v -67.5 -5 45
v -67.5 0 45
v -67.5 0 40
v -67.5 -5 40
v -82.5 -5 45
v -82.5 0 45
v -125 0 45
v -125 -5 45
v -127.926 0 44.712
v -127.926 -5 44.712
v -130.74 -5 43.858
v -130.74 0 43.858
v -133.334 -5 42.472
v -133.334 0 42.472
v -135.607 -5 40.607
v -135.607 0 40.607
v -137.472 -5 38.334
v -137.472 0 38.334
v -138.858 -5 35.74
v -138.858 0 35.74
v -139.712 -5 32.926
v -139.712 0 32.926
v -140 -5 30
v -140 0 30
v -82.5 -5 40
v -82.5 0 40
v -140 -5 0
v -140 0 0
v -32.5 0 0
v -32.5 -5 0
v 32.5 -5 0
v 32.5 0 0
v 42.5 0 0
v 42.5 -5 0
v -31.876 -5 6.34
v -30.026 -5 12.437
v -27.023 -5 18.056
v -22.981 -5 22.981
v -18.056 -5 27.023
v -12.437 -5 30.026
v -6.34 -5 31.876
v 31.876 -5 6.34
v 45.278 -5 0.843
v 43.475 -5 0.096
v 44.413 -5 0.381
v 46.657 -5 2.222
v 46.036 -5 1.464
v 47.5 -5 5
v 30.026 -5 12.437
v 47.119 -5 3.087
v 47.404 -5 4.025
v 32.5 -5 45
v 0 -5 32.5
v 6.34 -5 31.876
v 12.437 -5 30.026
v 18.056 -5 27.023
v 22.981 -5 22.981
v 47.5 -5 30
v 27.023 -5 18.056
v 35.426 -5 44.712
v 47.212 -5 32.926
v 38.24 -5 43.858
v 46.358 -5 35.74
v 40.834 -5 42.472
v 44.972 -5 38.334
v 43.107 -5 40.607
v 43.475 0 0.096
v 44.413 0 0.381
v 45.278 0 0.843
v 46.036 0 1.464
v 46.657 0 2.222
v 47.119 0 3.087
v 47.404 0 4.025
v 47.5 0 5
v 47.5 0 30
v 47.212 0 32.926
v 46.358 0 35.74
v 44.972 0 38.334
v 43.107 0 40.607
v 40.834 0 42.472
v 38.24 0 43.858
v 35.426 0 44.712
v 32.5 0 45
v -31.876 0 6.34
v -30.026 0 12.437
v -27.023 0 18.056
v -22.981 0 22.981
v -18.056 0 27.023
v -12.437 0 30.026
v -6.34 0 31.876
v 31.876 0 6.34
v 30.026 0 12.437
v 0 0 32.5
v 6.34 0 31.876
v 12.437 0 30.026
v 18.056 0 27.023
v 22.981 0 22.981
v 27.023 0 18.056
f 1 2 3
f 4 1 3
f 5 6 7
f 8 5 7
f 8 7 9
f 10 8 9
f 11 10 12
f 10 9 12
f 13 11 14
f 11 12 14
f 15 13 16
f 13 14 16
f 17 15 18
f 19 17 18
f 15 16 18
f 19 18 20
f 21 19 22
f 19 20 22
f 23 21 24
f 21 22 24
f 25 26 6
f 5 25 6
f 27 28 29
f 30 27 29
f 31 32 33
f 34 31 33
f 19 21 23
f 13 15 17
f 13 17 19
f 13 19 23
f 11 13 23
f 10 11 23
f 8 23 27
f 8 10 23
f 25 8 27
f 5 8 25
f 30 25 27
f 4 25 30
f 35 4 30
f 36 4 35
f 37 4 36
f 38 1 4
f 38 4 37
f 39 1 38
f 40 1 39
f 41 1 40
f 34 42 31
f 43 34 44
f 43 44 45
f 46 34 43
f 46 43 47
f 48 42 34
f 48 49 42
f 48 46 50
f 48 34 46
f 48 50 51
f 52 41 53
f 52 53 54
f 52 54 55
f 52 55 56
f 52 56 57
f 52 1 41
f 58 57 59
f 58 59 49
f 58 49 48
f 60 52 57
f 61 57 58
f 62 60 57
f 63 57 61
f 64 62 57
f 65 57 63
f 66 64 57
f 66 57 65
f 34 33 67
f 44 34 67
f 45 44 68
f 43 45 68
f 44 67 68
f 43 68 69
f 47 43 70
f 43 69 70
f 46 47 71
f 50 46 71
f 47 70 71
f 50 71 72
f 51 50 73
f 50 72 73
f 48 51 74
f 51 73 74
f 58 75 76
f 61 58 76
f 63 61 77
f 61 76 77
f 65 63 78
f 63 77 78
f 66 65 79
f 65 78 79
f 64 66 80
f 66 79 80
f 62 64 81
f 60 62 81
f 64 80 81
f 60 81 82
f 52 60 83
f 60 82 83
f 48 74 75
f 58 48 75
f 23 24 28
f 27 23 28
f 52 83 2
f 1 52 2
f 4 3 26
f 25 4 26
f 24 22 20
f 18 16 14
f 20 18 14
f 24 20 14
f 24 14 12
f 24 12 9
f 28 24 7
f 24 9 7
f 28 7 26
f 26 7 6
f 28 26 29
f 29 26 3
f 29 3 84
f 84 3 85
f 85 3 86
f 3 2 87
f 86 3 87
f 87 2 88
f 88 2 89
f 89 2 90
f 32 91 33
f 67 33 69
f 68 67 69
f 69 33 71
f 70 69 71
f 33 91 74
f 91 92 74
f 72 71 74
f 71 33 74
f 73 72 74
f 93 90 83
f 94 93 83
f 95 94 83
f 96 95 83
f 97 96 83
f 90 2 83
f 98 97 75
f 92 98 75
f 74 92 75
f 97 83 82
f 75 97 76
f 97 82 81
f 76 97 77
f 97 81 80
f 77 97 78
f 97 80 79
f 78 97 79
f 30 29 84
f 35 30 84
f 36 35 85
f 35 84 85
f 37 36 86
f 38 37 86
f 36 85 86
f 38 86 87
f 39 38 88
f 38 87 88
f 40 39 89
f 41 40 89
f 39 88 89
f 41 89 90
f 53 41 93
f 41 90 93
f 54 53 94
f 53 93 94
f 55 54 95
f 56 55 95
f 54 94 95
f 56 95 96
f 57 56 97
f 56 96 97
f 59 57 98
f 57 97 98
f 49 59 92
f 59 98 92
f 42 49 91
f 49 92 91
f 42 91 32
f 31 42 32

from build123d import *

# Parameters (mm, degrees)
F1_DEPTH = 5


with BuildPart() as f1:
    # F0 (on Front) → F1 (new body)
    with BuildSketch(Plane.XZ):
        with BuildLine():
            ThreePointArc((-32.5, 0), (0, 32.5), (32.5, 0))
            Line((32.5, 0), (42.5, 0))
            ThreePointArc((42.5, 0), (46.035534, 1.464466), (47.5, 5))
            Line((47.5, 5), (47.5, 30))
            ThreePointArc((47.5, 30), (43.106602, 40.606602), (32.5, 45))
            Line((32.5, 45), (-67.5, 45))
            Line((-67.5, 45), (-67.5, 40))
            Line((-67.5, 40), (-82.5, 40))
            Line((-82.5, 40), (-82.5, 45))
            Line((-82.5, 45), (-125, 45))
            ThreePointArc((-125, 45), (-135.606602, 40.606602), (-140, 30))
            Line((-140, 30), (-140, 0))
            Line((-140, 0), (-130, 0))
            Line((-130, 0), (-32.5, 0))
        make_face()
    extrude(amount=F1_DEPTH)


solid = f1.part
